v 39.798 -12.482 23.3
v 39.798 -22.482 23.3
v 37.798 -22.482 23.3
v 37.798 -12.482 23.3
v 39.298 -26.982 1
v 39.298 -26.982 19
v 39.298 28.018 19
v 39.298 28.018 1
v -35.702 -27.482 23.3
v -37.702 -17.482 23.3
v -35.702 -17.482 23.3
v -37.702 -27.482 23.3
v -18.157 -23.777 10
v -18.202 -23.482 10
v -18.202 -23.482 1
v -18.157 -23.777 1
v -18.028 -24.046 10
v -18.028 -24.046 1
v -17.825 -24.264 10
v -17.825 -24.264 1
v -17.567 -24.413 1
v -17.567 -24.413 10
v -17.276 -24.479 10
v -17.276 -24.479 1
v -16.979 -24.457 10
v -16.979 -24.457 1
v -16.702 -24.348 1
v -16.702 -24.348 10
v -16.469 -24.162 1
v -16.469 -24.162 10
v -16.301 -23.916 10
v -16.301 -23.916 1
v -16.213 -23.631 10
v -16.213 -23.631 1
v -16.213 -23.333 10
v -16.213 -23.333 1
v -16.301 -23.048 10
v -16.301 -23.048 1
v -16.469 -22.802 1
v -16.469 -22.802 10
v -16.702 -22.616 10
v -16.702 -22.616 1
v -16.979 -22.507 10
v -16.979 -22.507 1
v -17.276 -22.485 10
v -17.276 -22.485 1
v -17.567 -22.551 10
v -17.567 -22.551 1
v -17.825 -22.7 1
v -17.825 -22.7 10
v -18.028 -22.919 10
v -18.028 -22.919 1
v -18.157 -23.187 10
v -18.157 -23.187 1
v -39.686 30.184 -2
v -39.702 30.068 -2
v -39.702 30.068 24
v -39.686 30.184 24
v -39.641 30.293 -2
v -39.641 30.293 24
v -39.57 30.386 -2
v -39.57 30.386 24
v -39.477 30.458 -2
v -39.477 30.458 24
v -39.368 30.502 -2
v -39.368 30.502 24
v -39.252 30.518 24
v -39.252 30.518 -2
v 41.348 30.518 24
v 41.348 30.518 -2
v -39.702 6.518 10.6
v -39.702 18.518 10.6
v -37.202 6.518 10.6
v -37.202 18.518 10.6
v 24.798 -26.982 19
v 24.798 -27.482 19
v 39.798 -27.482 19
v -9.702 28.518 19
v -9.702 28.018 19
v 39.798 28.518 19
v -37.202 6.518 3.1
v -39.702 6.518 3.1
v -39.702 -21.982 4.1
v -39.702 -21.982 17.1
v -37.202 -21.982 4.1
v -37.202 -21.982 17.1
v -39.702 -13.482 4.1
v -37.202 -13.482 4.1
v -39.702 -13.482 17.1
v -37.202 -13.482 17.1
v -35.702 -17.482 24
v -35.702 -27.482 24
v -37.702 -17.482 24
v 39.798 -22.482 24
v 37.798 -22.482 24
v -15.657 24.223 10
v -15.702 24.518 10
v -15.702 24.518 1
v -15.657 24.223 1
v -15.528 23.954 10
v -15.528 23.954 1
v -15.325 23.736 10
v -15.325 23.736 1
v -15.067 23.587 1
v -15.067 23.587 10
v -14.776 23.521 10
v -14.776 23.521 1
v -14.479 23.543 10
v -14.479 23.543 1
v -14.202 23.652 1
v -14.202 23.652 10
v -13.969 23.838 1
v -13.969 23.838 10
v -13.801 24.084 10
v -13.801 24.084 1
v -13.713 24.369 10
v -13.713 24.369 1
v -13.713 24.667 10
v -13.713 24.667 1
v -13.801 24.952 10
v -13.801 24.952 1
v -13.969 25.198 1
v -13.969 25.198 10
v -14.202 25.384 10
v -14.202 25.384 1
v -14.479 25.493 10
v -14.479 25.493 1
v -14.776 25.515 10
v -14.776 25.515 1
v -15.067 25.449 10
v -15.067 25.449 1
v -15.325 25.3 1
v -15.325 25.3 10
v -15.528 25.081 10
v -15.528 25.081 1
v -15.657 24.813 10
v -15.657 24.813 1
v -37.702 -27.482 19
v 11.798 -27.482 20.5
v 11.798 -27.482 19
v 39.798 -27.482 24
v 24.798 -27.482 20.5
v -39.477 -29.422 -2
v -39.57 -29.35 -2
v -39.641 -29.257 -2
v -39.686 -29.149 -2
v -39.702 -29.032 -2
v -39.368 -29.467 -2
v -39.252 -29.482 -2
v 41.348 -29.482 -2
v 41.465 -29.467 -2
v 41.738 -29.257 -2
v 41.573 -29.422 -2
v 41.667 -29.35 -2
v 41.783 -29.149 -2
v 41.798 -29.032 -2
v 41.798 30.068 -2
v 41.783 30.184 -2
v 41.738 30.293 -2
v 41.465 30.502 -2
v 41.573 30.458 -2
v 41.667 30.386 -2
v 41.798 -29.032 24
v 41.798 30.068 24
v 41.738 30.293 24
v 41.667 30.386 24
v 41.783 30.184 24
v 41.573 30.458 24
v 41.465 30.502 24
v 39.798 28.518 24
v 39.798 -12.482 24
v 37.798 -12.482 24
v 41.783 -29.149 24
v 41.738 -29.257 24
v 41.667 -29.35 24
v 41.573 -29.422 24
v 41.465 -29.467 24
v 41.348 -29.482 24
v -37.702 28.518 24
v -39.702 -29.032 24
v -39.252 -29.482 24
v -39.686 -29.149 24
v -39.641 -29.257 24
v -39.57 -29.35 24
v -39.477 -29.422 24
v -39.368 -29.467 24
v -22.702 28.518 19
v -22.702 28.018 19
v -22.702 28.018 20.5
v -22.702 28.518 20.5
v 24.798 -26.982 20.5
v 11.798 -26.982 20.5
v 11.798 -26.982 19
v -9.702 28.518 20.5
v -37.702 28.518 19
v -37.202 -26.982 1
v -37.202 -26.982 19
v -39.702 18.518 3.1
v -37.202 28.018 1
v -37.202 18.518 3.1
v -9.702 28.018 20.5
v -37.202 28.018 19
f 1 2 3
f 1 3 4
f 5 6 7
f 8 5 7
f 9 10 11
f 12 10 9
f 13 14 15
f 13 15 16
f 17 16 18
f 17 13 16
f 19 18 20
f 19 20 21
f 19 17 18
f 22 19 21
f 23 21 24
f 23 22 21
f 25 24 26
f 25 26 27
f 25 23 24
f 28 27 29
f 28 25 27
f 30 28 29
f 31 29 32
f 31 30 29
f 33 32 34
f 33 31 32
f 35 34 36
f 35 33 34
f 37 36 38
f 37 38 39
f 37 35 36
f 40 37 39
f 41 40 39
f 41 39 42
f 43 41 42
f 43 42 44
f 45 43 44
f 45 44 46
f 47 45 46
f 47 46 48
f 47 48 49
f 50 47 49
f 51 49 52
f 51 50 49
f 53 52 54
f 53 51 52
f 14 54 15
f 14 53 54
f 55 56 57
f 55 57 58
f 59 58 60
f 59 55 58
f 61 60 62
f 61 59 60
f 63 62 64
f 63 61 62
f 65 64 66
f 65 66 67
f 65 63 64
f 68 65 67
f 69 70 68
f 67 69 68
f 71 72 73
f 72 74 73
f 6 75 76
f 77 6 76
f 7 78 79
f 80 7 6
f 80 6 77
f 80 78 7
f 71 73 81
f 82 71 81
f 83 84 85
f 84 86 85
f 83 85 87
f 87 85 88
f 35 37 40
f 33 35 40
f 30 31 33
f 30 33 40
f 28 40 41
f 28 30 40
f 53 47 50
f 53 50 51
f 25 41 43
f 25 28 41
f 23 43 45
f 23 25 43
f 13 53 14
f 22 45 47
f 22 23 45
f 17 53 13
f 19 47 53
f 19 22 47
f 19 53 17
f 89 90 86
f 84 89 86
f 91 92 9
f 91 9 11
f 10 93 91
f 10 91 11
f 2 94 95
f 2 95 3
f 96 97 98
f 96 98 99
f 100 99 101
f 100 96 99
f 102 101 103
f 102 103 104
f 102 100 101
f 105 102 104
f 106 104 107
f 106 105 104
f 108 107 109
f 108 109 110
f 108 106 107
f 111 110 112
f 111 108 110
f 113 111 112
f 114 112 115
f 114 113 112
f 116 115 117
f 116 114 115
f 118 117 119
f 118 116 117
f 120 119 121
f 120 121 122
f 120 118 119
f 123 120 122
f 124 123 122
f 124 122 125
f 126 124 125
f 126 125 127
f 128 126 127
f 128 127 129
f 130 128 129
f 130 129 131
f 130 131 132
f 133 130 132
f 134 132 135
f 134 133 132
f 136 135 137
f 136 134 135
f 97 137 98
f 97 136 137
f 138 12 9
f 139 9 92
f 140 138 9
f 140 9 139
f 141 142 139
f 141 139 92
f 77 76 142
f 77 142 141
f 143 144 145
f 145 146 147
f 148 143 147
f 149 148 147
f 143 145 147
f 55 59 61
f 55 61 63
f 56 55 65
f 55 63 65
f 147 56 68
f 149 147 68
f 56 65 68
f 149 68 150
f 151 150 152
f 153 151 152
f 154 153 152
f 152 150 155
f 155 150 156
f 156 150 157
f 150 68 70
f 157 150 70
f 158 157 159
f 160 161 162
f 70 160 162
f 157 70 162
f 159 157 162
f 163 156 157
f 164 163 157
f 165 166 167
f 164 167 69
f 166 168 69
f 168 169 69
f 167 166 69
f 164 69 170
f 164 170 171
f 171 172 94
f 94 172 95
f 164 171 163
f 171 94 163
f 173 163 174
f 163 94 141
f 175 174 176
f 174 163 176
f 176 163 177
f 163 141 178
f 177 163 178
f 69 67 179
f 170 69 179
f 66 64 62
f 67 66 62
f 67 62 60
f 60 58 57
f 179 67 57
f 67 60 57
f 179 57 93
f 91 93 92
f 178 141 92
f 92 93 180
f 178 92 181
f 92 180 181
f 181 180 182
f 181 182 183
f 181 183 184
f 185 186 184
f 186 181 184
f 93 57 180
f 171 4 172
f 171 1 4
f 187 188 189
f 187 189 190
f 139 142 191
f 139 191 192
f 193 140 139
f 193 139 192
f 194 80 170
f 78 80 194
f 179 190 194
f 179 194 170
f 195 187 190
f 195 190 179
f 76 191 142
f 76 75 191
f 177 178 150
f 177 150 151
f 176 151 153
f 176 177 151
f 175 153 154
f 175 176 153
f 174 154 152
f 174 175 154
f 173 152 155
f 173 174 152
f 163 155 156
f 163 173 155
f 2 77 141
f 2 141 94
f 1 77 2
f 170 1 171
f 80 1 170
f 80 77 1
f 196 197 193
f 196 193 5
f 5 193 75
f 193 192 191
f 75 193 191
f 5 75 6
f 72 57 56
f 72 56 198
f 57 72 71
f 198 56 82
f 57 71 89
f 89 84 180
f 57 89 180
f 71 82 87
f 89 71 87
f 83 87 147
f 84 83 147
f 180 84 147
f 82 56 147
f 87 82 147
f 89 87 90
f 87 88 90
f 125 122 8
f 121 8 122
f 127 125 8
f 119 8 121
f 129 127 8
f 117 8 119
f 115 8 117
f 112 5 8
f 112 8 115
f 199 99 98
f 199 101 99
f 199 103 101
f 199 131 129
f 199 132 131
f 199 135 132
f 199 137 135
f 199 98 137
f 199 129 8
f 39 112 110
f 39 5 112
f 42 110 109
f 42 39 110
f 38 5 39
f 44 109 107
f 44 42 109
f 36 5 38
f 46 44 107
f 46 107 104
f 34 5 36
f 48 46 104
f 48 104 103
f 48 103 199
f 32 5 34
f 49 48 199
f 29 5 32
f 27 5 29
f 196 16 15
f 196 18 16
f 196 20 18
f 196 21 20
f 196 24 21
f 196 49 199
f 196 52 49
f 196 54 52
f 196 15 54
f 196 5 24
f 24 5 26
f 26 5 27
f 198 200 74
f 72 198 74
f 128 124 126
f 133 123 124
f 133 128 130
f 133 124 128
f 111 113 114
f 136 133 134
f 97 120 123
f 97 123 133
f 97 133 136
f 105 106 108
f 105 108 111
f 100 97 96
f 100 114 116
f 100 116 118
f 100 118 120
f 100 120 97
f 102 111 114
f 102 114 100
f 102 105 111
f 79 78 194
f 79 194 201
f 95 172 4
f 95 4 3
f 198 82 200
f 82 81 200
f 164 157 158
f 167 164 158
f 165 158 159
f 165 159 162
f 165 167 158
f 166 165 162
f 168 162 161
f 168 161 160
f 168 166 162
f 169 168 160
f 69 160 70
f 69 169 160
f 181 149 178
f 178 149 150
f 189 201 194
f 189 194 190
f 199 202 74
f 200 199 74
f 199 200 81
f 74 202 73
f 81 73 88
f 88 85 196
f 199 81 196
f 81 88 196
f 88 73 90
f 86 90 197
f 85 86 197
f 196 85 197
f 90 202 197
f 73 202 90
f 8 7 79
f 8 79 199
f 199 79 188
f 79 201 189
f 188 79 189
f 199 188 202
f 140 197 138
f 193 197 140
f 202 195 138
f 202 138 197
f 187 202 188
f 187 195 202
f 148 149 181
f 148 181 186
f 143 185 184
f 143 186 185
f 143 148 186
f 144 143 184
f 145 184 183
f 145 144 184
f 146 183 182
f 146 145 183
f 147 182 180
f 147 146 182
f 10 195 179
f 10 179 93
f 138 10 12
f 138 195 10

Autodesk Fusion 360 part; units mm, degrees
sketch "Esquisse1" plane through (0, 0, 0) normal (0, 0, 1) x (1, 0, 0)
  line L0 (-37.7016, 28.5178) -> (39.7984, 28.5178)
  line L1 (39.7984, 28.5178) -> (39.7984, -27.4822)
  line L2 (39.7984, -27.4822) -> (-37.7016, -27.4822)
  line L3 (-37.7016, -27.4822) -> (-37.7016, 28.5178)
  dimension "d1" = 77.5
  dimension "d2" = 56
extrude "Extrusion1" add sketch "Esquisse1" along normal blind 19
sketch "Esquisse2" plane through (0, 0, 19) normal (0, 0, 1) x (-1, 0, 0)
  line L0 (37.7016, 27.4822) -> (-39.7984, 27.4822)
  line L1 (-39.7984, 27.4822) -> (-39.7984, -28.5178)
  line L2 (-39.7984, -28.5178) -> (37.7016, -28.5178)
  line L3 (37.7016, -28.5178) -> (37.7016, 27.4822)
  line L4 (-39.2984, -28.0178) -> (37.2016, -28.0178)
  line L5 (37.2016, -28.0178) -> (37.2016, 26.9822)
  line L6 (37.2016, 26.9822) -> (-39.2984, 26.9822)
  line L7 (-39.2984, 26.9822) -> (-39.2984, -28.0178)
  dimension "d5" = -0.5
extrude "Extrusion2" cut sketch "Esquisse2" against normal blind 15 contours L4 L5 L6 L7
sketch "Esquisse5" plane through (0, 0, 4) normal (0, 0, 1) x (-1, 0, 0)
  line L0 (-39.2984, 26.9822) -> (-39.2984, -28.0178)
  line L1 (-39.2984, -28.0178) -> (37.2016, -28.0178)
  line L2 (37.2016, -28.0178) -> (37.2016, 26.9822)
  line L3 (37.2016, 26.9822) -> (-39.2984, 26.9822)
  line L4 (37.7016, 27.4822) -> (-39.7984, 27.4822)
  line L5 (-39.2984, 26.9822) -> (37.2016, 26.9822)
  line L6 (37.2016, -28.0178) -> (-39.2984, -28.0178)
  line L7 (-39.7984, -28.5178) -> (37.7016, -28.5178)
  line L8 (-24.7984, 27.4822) -> (-11.7984, 27.4822)
  line L9 (-11.7984, 27.4822) -> (-11.7984, 26.9822)
  line L10 (-11.7984, 26.9822) -> (-24.7984, 26.9822)
  line L11 (-24.7984, 26.9822) -> (-24.7984, 27.4822)
  line L12 (9.7016, -28.0178) -> (22.7016, -28.0178)
  line L13 (22.7016, -28.0178) -> (22.7016, -28.5178)
  line L14 (22.7016, -28.5178) -> (9.7016, -28.5178)
  line L15 (9.7016, -28.5178) -> (9.7016, -28.0178)
  line L16 (-39.7984, 27.4822) -> (-39.7984, -28.5178)
  line L17 (-39.2984, -28.0178) -> (-39.2984, 26.9822)
  line L18 (37.2016, 26.9822) -> (37.2016, -28.0178)
  line L19 (37.7016, -28.5178) -> (37.7016, 27.4822)
  dimension "d11" = 13
  dimension "d12" = 13
  dimension "d13" = 15
  dimension "d14" = 15
extrude "Extrusion3" add sketch "Esquisse5" along normal blind 16.5 contours L3 L4 L5 L8 L9 L10 L11 | L1 L6 L7 L12 L13 L14 L15
sketch "Esquisse6" plane through (0, 0, 4) normal (0, 0, 1) x (-1, 0, 0)
  line L0 (-39.2984, 26.9822) -> (-39.2984, -28.0178)
  line L1 (-39.2984, -28.0178) -> (37.2016, -28.0178)
  line L2 (37.2016, -28.0178) -> (37.2016, 26.9822)
  line L3 (37.2016, 26.9822) -> (-39.2984, 26.9822)
  circle A0 centre (14.7016, -24.5178) radius 1
  circle A1 centre (17.2016, 23.4822) radius 1
  line L4 (37.7016, -28.5178) -> (37.7016, 27.4822)
  line L5 (9.7016, -28.5178) -> (22.7016, -28.5178)
  line L6 (37.7016, 27.4822) -> (-11.7984, 27.4822)
  dimension "d17" = 2
  dimension "d18" = 2
  dimension "d22" = 4
  dimension "d23" = 4
  dimension "d49" = 20
  dimension "d50" = 22.5
extrude "Extrusion4" add sketch "Esquisse6" along normal blind 6 contours A0 | A1
sketch "Esquisse7" plane through (-37.7016, 0, 0) normal (-1, 0, 0) x (0, -1, 0)
  line L0 (-28.5178, 0) -> (27.4822, 0)
  line L1 (27.4822, 0) -> (27.4822, 19)
  line L2 (27.4822, 19) -> (-28.5178, 19)
  line L3 (-28.5178, 19) -> (-28.5178, 0)
  line L4 (-18.5178, 10.6) -> (-6.5178, 10.6)
  line L5 (-6.5178, 10.6) -> (-6.5178, 3.1)
  line L6 (-6.5178, 3.1) -> (-18.5178, 3.1)
  line L7 (-18.5178, 3.1) -> (-18.5178, 10.6)
  line L8 (13.4822, 17.1) -> (21.9822, 17.1)
  line L9 (21.9822, 17.1) -> (21.9822, 4.1)
  line L10 (21.9822, 4.1) -> (13.4822, 4.1)
  line L11 (13.4822, 4.1) -> (13.4822, 17.1)
  dimension "d26" = 12
  dimension "d27" = 7.5
  dimension "d28" = 10
  dimension "d29" = 8.5
  dimension "d30" = 13
  dimension "d31" = 5.5
  dimension "d32" = 4.1
  dimension "d33" = 3.1
extrude "Extrusion5" cut sketch "Esquisse7" against normal blind 33 contours L4 L5 L6 L7 | L8 L9 L10 L11
extrude "Extrusion6" cut sketch "Esquisse6" against normal blind 3
extrude "Extrusion7" add 1 faces at (-11.8683, 9.8511, 0) along direction (0, 0, -1) blind 2
sketch "Esquisse8" plane through (0, 0, 0) normal (0, 0, 1) x (1, 0, 0)
  line L0 (39.7984, 28.5178) -> (-9.7016, 28.5178)
  line L1 (-9.7016, 28.5178) -> (-22.7016, 28.5178)
  line L2 (-22.7016, 28.5178) -> (-37.7016, 28.5178)
  line L3 (-37.7016, 28.5178) -> (-37.7016, -27.4822)
  line L4 (39.7984, -27.4822) -> (39.7984, 28.5178)
  line L5 (24.7984, -27.4822) -> (39.7984, -27.4822)
  line L6 (11.7984, -27.4822) -> (24.7984, -27.4822)
  line L7 (-37.7016, -27.4822) -> (11.7984, -27.4822)
  line L8 (24.7984, -29.4822) -> (41.7984, -29.4822)
  line L9 (41.7984, -29.4822) -> (41.7984, 30.5178)
  line L10 (41.7984, 30.5178) -> (-9.7016, 30.5178)
  line L11 (-9.7016, 30.5178) -> (-22.7016, 30.5178)
  line L12 (-22.7016, 30.5178) -> (-39.7016, 30.5178)
  line L13 (-39.7016, 30.5178) -> (-39.7016, -29.4822)
  line L14 (-39.7016, -29.4822) -> (11.7984, -29.4822)
  line L15 (11.7984, -29.4822) -> (24.7984, -29.4822)
  dimension "d40" = 2
extrude "Extrusion8" add sketch "Esquisse8" along normal blind 24 and the other way blind 2
extrude "Extrusion9" cut 2 faces at (-37.7016, -16.3155, 8.4333) (-37.7016, 14.5178, 5.6) along direction (1, 0, 0) blind 0 and the other way blind 5
extrude "Extrusion10" add sketch "Esquisse6" along normal blind 6 and the other way blind 2 contours A1
sketch "Esquisse9" plane through (39.7984, 0, 0) normal (-1, 0, 0) x (0, -1, 0)
  line L0 (-28.5178, 19) -> (27.4822, 19)
  line L1 (27.4822, 19) -> (27.4822, 24)
  line L2 (27.4822, 24) -> (-28.5178, 24)
  line L3 (-28.5178, 24) -> (-28.5178, 19)
  line L4 (12.4822, 24) -> (22.4822, 24)
  line L5 (22.4822, 24) -> (22.4822, 23.3)
  line L6 (22.4822, 23.3) -> (12.4822, 23.3)
  line L7 (12.4822, 23.3) -> (12.4822, 24)
  dimension "d55" = 10
  dimension "d56" = 0.7
  dimension "d57" = 5
extrude "Extrusion11" add sketch "Esquisse9" along normal blind 2 contours L2 L4 L5 L6 L7
sketch "Esquisse10" plane through (-37.7016, 0, 0) normal (1, 0, 0) x (0, 1, 0)
  line L0 (-27.4822, 19) -> (28.5178, 19)
  line L1 (28.5178, 19) -> (28.5178, 24)
  line L2 (28.5178, 24) -> (-27.4822, 24)
  line L3 (-27.4822, 24) -> (-27.4822, 19)
  line L4 (-27.4822, 24) -> (-17.4822, 24)
  line L5 (-17.4822, 24) -> (-17.4822, 23.3)
  line L6 (-17.4822, 23.3) -> (-27.4822, 23.3)
  line L7 (-27.4822, 23.3) -> (-27.4822, 24)
  dimension "d60" = 10
  dimension "d61" = 0.7
extrude "Extrusion12" add sketch "Esquisse10" along normal blind 2 contours L2 L3 L4 L5 L6 L7
fillet "Congé1" radius 0.45 4 edges at (41.7984, -29.4822, 11) (41.7984, 30.5178, 11) (-39.7016, 30.5178, 11) (-39.7016, -29.4822, 11)
equation "d1 = LongueurBoite"
equation "d2 = LargeurBoite"
equation "d26 = LargeurTrouUSB"
equation "d27 = HauteurTrouUSB"
equation "d28 = DistanceBordTrouUSB"
equation "d29 = LargeurTrouAC"
equation "d30 = HauteurTrouAC"
equation "d31 = DistanceBordTrouAC"
equation "d32 = DistanceDessousTrouAC"
equation "d33 = DistanceDessousTrouUSB"
equation "LargeurBoite = 56 mm"
equation "LongueurBoite = 77.5 mm"
equation "LargeurTrouAC = 8.5 mm"
equation "HauteurTrouAC = 13 mm"
equation "LargeurTrouUSB = 12 mm"
equation "HauteurTrouUSB = 7.5 mm"
equation "DistanceBordTrouUSB = 10 mm"
equation "DistanceBordTrouAC = 5.5 mm"
equation "DistanceDessousTrouUSB = 3.1 mm"
equation "DistanceDessousTrouAC = 4.1 mm"
